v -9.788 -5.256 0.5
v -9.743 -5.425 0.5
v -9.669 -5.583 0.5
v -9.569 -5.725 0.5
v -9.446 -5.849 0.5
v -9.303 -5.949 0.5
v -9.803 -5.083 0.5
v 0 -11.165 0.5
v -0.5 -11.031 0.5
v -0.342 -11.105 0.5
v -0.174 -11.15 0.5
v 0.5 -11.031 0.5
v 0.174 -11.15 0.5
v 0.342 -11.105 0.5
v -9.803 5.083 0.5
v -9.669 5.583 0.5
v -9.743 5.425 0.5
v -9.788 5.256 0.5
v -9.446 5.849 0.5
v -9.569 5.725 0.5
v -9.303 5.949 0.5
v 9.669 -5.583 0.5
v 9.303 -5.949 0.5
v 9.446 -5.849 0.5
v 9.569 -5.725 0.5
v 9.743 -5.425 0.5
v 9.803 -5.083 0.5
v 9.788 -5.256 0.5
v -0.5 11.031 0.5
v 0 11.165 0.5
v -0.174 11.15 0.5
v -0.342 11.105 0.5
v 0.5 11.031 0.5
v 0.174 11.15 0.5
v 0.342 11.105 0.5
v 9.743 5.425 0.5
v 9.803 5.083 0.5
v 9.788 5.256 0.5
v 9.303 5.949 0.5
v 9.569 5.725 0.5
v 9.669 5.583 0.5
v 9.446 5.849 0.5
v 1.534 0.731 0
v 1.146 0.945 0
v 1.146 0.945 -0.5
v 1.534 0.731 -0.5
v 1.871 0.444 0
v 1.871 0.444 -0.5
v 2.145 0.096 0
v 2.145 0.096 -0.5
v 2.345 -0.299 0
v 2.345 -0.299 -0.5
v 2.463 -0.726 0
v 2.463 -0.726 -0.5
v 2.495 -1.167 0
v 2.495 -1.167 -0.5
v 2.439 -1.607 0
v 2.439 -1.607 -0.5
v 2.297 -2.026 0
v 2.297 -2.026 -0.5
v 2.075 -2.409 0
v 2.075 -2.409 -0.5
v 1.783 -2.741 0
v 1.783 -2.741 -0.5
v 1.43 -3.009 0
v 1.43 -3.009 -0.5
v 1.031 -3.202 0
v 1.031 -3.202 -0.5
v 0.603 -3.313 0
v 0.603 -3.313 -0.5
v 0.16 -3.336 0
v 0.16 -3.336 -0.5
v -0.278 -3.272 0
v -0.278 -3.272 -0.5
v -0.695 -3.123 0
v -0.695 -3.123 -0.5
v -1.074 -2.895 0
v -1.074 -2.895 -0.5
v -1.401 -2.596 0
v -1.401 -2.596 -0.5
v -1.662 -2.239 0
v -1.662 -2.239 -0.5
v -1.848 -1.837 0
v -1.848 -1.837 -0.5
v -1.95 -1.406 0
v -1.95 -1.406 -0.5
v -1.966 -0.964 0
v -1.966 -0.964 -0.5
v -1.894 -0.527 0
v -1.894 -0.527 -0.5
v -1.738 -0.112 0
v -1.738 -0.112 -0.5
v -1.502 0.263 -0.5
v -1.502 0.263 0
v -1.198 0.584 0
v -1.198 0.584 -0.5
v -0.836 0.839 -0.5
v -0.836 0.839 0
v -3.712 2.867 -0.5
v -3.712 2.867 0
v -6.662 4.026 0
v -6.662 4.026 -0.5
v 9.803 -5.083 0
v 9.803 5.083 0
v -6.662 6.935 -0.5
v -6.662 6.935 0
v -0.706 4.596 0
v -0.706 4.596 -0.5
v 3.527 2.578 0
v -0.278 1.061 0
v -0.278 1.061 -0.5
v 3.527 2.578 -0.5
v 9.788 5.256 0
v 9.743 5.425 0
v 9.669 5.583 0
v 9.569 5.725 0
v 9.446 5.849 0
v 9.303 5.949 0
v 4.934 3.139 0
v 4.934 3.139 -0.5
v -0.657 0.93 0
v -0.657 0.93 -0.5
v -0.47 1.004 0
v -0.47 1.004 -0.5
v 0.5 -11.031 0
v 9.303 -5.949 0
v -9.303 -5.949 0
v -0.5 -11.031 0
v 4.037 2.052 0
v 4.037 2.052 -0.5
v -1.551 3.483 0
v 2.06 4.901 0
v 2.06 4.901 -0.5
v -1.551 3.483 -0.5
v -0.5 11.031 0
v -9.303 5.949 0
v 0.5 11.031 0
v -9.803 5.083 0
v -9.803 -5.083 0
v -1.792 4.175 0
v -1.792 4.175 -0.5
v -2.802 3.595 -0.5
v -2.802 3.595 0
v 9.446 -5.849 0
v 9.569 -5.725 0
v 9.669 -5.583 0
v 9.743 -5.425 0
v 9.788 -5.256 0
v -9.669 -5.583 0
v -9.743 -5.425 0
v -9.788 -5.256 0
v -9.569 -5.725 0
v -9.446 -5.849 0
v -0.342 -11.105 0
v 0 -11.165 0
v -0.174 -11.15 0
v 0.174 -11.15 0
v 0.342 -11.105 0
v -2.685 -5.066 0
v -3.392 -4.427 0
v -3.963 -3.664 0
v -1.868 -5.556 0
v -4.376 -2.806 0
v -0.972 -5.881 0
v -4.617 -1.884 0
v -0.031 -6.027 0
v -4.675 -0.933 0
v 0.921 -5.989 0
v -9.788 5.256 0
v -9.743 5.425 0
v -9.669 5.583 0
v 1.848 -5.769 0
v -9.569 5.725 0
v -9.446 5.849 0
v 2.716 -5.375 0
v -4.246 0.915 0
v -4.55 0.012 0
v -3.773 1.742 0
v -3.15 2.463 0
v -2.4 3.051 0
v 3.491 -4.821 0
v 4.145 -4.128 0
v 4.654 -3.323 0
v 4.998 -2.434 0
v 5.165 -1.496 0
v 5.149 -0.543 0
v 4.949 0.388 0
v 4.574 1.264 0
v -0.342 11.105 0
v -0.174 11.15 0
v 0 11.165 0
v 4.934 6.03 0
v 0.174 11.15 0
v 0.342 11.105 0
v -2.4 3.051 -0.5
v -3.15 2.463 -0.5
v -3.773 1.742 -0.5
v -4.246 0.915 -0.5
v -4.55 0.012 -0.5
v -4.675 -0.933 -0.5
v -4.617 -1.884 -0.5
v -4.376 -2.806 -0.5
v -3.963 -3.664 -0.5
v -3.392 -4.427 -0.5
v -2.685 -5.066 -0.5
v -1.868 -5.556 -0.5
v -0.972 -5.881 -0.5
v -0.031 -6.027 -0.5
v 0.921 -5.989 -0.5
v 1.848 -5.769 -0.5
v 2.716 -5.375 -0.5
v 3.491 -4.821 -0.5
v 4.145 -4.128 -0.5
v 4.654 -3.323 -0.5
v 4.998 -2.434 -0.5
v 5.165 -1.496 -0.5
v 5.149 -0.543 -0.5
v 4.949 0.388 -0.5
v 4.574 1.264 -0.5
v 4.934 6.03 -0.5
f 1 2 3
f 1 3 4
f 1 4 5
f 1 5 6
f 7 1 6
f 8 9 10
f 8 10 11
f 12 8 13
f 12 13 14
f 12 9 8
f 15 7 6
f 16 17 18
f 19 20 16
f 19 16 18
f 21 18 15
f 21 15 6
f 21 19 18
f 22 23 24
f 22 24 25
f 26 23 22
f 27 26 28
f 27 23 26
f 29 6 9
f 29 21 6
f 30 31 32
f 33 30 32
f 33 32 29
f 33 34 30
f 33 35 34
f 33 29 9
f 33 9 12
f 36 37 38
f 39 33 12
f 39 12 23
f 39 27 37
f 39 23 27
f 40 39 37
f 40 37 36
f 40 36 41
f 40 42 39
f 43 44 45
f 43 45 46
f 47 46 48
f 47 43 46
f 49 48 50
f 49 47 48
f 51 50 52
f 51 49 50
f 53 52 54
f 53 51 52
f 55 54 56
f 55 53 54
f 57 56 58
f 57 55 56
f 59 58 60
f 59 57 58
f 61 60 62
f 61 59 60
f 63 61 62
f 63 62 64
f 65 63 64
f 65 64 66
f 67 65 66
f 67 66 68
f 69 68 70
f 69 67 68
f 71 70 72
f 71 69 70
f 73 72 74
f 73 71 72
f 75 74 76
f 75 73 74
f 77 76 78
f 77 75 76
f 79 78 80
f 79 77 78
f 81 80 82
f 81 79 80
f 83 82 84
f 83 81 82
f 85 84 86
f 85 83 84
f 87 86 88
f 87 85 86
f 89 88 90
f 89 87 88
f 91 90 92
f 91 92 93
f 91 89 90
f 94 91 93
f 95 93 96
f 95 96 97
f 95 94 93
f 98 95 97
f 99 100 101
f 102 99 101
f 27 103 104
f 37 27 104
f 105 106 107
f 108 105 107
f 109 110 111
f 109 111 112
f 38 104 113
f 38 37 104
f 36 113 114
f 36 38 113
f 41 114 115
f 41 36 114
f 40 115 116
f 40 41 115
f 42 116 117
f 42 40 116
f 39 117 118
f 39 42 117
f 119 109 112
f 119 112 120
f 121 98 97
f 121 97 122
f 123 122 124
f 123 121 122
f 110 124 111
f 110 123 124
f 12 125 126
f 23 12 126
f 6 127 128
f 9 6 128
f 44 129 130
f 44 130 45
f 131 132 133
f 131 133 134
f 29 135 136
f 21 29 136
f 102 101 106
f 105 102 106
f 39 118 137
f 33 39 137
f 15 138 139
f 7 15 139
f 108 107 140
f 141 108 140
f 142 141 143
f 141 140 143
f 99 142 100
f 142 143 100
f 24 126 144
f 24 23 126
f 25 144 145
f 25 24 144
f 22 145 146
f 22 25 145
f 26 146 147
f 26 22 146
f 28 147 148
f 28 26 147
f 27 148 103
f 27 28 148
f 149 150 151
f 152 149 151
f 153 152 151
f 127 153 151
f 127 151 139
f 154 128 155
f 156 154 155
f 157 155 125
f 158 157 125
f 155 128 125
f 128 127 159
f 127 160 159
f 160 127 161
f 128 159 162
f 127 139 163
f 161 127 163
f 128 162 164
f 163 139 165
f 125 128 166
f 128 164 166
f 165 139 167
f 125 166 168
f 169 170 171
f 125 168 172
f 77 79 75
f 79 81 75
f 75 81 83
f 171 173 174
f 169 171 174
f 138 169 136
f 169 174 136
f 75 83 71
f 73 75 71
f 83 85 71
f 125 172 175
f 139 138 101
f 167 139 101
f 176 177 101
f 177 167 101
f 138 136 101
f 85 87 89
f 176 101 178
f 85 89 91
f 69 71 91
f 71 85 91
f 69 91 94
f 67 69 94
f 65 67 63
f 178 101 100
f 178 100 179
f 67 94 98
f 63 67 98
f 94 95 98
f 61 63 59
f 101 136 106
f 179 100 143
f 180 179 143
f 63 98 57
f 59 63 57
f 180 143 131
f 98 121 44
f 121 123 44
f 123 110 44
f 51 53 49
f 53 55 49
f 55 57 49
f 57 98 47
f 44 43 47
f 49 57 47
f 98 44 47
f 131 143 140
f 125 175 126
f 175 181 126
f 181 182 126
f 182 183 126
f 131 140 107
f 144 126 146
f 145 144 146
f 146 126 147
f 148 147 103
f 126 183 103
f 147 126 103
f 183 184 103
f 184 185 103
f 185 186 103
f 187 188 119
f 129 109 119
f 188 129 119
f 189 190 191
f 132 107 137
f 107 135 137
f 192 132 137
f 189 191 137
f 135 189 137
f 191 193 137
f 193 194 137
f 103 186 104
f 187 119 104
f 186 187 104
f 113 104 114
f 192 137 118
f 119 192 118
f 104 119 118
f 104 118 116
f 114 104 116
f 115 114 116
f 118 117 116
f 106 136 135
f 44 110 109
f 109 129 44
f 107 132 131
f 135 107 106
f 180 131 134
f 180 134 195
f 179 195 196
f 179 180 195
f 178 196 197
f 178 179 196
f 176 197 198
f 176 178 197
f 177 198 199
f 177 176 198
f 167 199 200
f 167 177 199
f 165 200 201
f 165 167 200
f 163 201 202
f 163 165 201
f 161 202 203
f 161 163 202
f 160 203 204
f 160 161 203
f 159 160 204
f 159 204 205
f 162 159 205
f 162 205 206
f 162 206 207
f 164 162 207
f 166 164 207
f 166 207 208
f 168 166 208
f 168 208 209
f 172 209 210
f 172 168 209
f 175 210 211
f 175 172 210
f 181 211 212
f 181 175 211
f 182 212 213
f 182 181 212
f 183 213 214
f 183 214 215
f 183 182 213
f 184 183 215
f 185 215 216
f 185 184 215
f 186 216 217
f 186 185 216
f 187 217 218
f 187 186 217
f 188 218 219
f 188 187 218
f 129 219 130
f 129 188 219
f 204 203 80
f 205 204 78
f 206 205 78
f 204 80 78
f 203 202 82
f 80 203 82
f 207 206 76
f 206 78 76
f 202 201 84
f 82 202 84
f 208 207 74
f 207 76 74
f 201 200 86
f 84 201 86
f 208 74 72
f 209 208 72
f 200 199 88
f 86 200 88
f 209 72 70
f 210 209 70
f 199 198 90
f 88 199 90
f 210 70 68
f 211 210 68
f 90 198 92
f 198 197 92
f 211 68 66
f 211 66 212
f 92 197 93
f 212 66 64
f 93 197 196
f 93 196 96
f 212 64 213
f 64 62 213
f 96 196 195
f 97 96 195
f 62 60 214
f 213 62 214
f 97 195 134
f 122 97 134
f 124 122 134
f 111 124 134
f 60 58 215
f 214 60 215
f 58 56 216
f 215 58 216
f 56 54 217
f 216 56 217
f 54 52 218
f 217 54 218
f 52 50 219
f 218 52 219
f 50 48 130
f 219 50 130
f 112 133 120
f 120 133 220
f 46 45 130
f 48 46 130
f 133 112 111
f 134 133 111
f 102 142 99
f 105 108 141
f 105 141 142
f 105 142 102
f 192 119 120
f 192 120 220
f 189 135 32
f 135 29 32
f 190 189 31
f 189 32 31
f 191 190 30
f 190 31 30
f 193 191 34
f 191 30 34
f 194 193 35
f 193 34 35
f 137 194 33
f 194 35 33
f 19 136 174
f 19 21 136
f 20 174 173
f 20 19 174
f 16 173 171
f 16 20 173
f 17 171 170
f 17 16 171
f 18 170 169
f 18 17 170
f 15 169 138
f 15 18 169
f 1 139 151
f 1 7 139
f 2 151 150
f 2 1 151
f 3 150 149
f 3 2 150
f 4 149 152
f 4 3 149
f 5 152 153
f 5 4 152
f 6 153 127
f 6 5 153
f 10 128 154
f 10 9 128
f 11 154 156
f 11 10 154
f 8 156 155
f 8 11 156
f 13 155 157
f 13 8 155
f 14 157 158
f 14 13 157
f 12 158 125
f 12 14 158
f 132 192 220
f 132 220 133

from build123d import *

# Parameters (mm, degrees)
EXTRUDE_1_DEPTH = 0.5
FILLET_1_R      = 1
EXTRUDE_3_DEPTH = 0.5


with BuildPart() as part:
    # 草图1 → 凸台-拉伸1 (new body)
    with BuildSketch(Plane.XY):
        Polygon((0, 11.32), (-9.803407571, 5.66), (-9.803407571, -5.66), (0, -11.32), (9.803407571, -5.66), (9.803407571, 5.66), align=None)
    extrude(amount=EXTRUDE_1_DEPTH)

    # 圆角1
    fillet_1_edges = [part.edges().sort_by_distance(p)[0] for p in [
        (9.803407571, 5.66, 0.25),
        (9.803407571, -5.66, 0.25),
        (0, -11.32, 0.25),
        (-9.803407571, -5.66, 0.25),
        (-9.803407571, 5.66, 0.25),
        (0, 11.32, 0.25),
    ]]
    fillet(fillet_1_edges, radius=FILLET_1_R)

    # 草图3 → 凸台-拉伸3 (add)
    with BuildSketch(Plane.XY):
        with BuildLine():
            ThreePointArc((-0.705543929, 4.595579399), (-2.307952893, 3.904221506), (-3.711787683, 2.867429289))
            Line((-3.711787683, 2.867429289), (-6.661562741, 4.026250683))
            Line((-6.661562741, 4.026250683), (-6.661562741, 6.935405958))
            Line((-6.661562741, 6.935405958), (-0.705543929, 4.595579399))
        make_face()
        with BuildLine():
            Line((4.934454899, 3.138543991), (4.934454899, 6.0297367))
            Line((4.934454899, 6.0297367), (2.059575955, 4.900778413))
            Line((2.059575955, 4.900778413), (-1.550809491, 3.48298843))
            ThreePointArc((-1.550809491, 3.48298843), (-0.972236897, -5.880889221), (4.037122418, 2.051529715))
            Line((4.037122418, 2.051529715), (1.146295729, 0.94525211))
            ThreePointArc((1.146295729, 0.94525211), (0.382149802, -3.335491783), (-0.835814603, 0.838864453))
            ThreePointArc((-0.835814603, 0.838864453), (-0.56429829, 0.968919842), (-0.277756056, 1.061272752))
            Line((-0.277756056, 1.061272752), (3.527417355, 2.577784143))
            Line((3.527417355, 2.577784143), (4.934454899, 3.138543991))
        make_face()
    extrude(amount=-EXTRUDE_3_DEPTH)


solid = part.part
